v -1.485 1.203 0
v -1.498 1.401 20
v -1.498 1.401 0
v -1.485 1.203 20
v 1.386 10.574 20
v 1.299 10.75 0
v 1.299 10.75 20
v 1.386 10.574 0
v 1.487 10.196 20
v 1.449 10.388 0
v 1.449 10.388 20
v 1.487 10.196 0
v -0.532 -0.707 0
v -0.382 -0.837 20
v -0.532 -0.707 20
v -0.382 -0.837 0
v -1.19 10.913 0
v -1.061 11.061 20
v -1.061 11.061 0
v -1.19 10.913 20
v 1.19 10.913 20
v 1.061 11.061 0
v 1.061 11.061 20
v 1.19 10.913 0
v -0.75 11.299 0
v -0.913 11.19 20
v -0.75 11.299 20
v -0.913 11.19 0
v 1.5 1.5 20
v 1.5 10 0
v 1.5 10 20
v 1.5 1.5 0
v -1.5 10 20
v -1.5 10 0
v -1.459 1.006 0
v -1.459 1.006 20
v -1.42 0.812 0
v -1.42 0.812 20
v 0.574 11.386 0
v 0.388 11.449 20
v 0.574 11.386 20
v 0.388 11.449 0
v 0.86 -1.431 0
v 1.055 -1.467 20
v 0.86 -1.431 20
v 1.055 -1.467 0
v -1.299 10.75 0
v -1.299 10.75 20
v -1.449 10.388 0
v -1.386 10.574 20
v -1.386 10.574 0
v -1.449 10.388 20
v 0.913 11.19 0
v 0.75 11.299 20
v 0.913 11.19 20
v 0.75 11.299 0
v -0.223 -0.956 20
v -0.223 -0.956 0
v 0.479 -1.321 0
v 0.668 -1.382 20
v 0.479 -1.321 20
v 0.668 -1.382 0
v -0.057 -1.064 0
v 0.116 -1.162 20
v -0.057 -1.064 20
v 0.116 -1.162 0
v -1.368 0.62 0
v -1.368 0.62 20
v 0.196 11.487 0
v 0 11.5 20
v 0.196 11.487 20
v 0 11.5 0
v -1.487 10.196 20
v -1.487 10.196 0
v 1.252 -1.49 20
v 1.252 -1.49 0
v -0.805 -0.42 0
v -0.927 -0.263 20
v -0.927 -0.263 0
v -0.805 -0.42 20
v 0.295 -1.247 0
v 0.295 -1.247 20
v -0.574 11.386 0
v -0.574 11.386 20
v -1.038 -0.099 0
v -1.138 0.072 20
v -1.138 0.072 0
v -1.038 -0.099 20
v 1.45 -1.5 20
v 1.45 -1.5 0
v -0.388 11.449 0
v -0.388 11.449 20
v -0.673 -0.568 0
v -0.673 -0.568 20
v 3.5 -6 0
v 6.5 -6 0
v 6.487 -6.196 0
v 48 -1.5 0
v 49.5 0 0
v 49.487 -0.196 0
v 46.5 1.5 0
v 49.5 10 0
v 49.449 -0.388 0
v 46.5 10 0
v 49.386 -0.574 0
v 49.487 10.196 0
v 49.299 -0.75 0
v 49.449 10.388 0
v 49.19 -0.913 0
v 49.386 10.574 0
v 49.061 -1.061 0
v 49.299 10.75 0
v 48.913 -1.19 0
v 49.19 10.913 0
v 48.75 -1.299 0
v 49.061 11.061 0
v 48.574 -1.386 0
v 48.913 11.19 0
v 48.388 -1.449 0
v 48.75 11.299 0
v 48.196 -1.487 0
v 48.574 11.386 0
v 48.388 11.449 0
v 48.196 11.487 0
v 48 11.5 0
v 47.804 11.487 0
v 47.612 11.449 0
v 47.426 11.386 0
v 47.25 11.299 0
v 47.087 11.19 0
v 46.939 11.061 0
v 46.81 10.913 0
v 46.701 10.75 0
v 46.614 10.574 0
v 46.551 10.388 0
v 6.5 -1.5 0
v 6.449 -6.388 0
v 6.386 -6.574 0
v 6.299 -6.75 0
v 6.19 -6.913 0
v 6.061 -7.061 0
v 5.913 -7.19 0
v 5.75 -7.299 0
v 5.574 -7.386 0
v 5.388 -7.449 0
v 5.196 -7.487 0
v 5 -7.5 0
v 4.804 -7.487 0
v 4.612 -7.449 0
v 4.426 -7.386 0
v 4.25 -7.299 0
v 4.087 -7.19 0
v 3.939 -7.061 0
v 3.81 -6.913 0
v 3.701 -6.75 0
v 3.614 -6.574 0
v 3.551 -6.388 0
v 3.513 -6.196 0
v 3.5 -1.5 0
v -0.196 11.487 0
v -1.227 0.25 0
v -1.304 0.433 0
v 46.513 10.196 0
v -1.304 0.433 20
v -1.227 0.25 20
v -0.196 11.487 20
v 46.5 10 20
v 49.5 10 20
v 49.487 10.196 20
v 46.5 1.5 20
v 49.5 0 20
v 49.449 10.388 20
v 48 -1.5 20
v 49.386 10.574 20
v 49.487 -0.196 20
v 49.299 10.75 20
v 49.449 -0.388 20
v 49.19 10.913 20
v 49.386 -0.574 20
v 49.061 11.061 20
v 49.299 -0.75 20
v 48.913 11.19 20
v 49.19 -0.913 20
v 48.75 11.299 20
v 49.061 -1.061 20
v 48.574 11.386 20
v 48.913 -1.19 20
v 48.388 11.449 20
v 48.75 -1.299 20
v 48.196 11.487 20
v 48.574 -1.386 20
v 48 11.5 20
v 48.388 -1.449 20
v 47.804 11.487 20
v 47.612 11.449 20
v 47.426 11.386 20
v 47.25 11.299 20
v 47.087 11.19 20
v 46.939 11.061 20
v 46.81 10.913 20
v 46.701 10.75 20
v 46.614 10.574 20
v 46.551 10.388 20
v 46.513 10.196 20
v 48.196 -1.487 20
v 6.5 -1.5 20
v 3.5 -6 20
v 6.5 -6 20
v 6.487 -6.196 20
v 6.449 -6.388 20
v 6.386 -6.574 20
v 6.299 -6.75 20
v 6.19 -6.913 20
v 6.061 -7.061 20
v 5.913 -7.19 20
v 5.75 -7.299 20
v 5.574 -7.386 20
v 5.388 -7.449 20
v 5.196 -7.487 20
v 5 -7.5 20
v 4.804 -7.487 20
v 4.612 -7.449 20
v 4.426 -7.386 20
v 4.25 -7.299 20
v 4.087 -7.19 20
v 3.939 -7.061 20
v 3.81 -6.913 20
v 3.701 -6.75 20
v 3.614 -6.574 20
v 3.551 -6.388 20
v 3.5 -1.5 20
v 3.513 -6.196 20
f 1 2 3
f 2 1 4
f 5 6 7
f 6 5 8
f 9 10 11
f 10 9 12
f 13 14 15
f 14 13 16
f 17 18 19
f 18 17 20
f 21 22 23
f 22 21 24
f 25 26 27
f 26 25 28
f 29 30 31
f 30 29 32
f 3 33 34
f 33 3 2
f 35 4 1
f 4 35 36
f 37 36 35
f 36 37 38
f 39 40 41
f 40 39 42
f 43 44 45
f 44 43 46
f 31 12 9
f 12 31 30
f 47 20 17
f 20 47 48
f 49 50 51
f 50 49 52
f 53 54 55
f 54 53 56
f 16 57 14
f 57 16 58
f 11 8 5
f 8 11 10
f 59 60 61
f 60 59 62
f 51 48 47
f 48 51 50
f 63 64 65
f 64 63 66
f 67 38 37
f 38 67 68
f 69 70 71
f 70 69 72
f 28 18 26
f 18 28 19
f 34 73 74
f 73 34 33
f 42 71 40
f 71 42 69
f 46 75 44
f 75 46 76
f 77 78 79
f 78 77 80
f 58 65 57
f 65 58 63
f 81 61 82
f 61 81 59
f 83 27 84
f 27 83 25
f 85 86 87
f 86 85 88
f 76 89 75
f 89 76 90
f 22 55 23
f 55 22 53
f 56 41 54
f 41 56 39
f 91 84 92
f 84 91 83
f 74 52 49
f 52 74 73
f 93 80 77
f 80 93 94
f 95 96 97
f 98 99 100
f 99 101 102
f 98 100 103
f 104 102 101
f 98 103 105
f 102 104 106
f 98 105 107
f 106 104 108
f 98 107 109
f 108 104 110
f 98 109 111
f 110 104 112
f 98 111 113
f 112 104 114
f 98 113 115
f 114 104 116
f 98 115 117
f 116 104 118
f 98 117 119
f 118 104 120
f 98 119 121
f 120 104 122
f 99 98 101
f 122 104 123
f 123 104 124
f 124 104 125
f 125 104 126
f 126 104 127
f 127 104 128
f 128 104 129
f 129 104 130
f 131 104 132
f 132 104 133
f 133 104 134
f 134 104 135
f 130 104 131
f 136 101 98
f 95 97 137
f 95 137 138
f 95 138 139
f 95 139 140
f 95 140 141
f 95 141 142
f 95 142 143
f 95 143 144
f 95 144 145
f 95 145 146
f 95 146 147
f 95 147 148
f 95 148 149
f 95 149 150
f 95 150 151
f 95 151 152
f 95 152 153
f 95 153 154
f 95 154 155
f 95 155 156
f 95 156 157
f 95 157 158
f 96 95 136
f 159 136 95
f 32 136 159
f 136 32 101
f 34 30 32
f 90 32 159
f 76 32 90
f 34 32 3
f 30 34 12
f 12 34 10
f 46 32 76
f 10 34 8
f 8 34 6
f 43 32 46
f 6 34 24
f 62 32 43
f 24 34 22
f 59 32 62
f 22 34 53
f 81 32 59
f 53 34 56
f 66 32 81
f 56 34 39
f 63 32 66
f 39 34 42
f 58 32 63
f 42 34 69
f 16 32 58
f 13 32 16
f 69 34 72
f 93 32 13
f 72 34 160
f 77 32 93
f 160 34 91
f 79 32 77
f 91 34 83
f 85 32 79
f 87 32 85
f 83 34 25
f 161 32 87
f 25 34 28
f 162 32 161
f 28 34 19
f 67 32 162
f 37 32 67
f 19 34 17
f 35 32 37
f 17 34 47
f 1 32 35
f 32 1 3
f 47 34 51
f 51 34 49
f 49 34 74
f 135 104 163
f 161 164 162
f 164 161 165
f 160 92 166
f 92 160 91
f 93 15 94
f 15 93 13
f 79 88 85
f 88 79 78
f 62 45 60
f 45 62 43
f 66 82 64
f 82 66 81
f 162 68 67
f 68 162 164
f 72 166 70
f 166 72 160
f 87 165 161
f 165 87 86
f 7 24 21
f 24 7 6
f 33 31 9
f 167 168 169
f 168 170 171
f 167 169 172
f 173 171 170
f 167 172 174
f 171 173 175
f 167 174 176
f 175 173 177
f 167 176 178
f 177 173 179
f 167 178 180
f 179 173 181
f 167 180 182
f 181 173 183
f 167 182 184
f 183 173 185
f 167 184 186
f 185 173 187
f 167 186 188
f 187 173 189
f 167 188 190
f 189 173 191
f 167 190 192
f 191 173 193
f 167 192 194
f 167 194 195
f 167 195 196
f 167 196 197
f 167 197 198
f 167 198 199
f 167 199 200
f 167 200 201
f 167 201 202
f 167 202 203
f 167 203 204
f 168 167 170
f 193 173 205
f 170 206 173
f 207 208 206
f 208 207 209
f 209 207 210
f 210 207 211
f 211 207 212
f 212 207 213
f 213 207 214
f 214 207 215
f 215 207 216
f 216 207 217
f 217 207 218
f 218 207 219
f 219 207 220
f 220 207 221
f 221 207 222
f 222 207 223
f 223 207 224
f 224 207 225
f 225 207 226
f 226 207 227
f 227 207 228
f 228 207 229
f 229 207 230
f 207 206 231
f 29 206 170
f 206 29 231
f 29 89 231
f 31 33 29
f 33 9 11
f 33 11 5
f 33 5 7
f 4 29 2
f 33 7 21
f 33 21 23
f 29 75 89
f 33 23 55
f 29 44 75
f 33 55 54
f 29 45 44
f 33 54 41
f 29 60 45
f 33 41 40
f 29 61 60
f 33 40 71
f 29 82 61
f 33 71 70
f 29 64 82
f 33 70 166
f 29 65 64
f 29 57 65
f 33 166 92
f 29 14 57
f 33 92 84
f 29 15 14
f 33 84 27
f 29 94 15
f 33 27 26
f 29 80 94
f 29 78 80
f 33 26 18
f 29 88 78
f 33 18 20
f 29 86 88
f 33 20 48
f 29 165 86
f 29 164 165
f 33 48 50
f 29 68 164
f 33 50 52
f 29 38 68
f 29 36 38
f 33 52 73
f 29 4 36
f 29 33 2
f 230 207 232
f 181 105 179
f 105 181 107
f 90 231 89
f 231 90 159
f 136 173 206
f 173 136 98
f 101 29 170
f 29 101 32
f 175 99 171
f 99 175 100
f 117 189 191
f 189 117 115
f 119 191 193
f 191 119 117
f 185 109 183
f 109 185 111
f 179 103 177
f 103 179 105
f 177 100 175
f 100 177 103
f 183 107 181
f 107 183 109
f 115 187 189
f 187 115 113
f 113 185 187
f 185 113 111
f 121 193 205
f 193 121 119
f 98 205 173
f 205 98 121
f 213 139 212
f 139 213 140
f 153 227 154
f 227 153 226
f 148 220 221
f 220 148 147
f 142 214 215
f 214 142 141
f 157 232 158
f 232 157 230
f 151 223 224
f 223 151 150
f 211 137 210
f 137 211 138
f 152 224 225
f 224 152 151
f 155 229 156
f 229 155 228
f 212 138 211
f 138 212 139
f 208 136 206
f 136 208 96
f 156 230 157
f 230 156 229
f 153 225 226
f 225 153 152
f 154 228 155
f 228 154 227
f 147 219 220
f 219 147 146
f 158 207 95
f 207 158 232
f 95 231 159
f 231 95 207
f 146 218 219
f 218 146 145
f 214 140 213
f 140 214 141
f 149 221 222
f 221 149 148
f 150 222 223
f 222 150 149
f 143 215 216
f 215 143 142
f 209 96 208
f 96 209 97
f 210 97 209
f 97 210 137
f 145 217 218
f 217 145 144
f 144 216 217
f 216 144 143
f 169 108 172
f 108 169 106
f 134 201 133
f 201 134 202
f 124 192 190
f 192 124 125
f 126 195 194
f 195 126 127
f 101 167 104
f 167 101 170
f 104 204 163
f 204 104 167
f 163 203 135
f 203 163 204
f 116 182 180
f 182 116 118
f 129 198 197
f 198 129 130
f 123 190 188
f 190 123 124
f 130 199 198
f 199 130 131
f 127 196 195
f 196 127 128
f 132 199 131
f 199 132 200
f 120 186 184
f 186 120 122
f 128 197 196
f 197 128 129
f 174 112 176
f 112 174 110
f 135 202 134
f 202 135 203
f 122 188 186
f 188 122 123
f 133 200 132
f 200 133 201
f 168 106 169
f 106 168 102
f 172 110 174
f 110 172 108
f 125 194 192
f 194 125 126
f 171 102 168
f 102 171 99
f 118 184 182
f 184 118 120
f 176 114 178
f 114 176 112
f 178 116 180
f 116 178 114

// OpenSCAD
//Settings.
width = 20;
length = 45;
thickness = 3;
back_hook_length = 10;
down_hook_length = 6;
front_hook_length = 10;
steel_thickness = 2;
$fs = 0.2;
$fa = 1;

module corner() {
	cylinder(r = thickness / 2, h=width);
}
module spaced_corner() {
	intersection() {
		translate([thickness / 2, thickness / 2, 0]) {
			cylinder(r = thickness, h=width);
		}
		translate([-thickness / 2, -thickness / 2, 0]) {
			cube([thickness, thickness, width]);
		}
	}
}

hull() {
	spaced_corner();
	translate([0, back_hook_length, 0]) {
		corner();
	}
}
hull() {
	spaced_corner();
	translate([length + thickness, 0, 0]) {
		corner();
	}
}
translate([thickness + steel_thickness, 0, 0]) {
	hull() {
		corner();
		translate([0, -down_hook_length, 0]) {
			corner();
		}
	}
}
translate([length + thickness, 0, 0]) {
	hull() {
		corner();
		translate([0, front_hook_length, 0]) {
			corner();
		}
	}
}
